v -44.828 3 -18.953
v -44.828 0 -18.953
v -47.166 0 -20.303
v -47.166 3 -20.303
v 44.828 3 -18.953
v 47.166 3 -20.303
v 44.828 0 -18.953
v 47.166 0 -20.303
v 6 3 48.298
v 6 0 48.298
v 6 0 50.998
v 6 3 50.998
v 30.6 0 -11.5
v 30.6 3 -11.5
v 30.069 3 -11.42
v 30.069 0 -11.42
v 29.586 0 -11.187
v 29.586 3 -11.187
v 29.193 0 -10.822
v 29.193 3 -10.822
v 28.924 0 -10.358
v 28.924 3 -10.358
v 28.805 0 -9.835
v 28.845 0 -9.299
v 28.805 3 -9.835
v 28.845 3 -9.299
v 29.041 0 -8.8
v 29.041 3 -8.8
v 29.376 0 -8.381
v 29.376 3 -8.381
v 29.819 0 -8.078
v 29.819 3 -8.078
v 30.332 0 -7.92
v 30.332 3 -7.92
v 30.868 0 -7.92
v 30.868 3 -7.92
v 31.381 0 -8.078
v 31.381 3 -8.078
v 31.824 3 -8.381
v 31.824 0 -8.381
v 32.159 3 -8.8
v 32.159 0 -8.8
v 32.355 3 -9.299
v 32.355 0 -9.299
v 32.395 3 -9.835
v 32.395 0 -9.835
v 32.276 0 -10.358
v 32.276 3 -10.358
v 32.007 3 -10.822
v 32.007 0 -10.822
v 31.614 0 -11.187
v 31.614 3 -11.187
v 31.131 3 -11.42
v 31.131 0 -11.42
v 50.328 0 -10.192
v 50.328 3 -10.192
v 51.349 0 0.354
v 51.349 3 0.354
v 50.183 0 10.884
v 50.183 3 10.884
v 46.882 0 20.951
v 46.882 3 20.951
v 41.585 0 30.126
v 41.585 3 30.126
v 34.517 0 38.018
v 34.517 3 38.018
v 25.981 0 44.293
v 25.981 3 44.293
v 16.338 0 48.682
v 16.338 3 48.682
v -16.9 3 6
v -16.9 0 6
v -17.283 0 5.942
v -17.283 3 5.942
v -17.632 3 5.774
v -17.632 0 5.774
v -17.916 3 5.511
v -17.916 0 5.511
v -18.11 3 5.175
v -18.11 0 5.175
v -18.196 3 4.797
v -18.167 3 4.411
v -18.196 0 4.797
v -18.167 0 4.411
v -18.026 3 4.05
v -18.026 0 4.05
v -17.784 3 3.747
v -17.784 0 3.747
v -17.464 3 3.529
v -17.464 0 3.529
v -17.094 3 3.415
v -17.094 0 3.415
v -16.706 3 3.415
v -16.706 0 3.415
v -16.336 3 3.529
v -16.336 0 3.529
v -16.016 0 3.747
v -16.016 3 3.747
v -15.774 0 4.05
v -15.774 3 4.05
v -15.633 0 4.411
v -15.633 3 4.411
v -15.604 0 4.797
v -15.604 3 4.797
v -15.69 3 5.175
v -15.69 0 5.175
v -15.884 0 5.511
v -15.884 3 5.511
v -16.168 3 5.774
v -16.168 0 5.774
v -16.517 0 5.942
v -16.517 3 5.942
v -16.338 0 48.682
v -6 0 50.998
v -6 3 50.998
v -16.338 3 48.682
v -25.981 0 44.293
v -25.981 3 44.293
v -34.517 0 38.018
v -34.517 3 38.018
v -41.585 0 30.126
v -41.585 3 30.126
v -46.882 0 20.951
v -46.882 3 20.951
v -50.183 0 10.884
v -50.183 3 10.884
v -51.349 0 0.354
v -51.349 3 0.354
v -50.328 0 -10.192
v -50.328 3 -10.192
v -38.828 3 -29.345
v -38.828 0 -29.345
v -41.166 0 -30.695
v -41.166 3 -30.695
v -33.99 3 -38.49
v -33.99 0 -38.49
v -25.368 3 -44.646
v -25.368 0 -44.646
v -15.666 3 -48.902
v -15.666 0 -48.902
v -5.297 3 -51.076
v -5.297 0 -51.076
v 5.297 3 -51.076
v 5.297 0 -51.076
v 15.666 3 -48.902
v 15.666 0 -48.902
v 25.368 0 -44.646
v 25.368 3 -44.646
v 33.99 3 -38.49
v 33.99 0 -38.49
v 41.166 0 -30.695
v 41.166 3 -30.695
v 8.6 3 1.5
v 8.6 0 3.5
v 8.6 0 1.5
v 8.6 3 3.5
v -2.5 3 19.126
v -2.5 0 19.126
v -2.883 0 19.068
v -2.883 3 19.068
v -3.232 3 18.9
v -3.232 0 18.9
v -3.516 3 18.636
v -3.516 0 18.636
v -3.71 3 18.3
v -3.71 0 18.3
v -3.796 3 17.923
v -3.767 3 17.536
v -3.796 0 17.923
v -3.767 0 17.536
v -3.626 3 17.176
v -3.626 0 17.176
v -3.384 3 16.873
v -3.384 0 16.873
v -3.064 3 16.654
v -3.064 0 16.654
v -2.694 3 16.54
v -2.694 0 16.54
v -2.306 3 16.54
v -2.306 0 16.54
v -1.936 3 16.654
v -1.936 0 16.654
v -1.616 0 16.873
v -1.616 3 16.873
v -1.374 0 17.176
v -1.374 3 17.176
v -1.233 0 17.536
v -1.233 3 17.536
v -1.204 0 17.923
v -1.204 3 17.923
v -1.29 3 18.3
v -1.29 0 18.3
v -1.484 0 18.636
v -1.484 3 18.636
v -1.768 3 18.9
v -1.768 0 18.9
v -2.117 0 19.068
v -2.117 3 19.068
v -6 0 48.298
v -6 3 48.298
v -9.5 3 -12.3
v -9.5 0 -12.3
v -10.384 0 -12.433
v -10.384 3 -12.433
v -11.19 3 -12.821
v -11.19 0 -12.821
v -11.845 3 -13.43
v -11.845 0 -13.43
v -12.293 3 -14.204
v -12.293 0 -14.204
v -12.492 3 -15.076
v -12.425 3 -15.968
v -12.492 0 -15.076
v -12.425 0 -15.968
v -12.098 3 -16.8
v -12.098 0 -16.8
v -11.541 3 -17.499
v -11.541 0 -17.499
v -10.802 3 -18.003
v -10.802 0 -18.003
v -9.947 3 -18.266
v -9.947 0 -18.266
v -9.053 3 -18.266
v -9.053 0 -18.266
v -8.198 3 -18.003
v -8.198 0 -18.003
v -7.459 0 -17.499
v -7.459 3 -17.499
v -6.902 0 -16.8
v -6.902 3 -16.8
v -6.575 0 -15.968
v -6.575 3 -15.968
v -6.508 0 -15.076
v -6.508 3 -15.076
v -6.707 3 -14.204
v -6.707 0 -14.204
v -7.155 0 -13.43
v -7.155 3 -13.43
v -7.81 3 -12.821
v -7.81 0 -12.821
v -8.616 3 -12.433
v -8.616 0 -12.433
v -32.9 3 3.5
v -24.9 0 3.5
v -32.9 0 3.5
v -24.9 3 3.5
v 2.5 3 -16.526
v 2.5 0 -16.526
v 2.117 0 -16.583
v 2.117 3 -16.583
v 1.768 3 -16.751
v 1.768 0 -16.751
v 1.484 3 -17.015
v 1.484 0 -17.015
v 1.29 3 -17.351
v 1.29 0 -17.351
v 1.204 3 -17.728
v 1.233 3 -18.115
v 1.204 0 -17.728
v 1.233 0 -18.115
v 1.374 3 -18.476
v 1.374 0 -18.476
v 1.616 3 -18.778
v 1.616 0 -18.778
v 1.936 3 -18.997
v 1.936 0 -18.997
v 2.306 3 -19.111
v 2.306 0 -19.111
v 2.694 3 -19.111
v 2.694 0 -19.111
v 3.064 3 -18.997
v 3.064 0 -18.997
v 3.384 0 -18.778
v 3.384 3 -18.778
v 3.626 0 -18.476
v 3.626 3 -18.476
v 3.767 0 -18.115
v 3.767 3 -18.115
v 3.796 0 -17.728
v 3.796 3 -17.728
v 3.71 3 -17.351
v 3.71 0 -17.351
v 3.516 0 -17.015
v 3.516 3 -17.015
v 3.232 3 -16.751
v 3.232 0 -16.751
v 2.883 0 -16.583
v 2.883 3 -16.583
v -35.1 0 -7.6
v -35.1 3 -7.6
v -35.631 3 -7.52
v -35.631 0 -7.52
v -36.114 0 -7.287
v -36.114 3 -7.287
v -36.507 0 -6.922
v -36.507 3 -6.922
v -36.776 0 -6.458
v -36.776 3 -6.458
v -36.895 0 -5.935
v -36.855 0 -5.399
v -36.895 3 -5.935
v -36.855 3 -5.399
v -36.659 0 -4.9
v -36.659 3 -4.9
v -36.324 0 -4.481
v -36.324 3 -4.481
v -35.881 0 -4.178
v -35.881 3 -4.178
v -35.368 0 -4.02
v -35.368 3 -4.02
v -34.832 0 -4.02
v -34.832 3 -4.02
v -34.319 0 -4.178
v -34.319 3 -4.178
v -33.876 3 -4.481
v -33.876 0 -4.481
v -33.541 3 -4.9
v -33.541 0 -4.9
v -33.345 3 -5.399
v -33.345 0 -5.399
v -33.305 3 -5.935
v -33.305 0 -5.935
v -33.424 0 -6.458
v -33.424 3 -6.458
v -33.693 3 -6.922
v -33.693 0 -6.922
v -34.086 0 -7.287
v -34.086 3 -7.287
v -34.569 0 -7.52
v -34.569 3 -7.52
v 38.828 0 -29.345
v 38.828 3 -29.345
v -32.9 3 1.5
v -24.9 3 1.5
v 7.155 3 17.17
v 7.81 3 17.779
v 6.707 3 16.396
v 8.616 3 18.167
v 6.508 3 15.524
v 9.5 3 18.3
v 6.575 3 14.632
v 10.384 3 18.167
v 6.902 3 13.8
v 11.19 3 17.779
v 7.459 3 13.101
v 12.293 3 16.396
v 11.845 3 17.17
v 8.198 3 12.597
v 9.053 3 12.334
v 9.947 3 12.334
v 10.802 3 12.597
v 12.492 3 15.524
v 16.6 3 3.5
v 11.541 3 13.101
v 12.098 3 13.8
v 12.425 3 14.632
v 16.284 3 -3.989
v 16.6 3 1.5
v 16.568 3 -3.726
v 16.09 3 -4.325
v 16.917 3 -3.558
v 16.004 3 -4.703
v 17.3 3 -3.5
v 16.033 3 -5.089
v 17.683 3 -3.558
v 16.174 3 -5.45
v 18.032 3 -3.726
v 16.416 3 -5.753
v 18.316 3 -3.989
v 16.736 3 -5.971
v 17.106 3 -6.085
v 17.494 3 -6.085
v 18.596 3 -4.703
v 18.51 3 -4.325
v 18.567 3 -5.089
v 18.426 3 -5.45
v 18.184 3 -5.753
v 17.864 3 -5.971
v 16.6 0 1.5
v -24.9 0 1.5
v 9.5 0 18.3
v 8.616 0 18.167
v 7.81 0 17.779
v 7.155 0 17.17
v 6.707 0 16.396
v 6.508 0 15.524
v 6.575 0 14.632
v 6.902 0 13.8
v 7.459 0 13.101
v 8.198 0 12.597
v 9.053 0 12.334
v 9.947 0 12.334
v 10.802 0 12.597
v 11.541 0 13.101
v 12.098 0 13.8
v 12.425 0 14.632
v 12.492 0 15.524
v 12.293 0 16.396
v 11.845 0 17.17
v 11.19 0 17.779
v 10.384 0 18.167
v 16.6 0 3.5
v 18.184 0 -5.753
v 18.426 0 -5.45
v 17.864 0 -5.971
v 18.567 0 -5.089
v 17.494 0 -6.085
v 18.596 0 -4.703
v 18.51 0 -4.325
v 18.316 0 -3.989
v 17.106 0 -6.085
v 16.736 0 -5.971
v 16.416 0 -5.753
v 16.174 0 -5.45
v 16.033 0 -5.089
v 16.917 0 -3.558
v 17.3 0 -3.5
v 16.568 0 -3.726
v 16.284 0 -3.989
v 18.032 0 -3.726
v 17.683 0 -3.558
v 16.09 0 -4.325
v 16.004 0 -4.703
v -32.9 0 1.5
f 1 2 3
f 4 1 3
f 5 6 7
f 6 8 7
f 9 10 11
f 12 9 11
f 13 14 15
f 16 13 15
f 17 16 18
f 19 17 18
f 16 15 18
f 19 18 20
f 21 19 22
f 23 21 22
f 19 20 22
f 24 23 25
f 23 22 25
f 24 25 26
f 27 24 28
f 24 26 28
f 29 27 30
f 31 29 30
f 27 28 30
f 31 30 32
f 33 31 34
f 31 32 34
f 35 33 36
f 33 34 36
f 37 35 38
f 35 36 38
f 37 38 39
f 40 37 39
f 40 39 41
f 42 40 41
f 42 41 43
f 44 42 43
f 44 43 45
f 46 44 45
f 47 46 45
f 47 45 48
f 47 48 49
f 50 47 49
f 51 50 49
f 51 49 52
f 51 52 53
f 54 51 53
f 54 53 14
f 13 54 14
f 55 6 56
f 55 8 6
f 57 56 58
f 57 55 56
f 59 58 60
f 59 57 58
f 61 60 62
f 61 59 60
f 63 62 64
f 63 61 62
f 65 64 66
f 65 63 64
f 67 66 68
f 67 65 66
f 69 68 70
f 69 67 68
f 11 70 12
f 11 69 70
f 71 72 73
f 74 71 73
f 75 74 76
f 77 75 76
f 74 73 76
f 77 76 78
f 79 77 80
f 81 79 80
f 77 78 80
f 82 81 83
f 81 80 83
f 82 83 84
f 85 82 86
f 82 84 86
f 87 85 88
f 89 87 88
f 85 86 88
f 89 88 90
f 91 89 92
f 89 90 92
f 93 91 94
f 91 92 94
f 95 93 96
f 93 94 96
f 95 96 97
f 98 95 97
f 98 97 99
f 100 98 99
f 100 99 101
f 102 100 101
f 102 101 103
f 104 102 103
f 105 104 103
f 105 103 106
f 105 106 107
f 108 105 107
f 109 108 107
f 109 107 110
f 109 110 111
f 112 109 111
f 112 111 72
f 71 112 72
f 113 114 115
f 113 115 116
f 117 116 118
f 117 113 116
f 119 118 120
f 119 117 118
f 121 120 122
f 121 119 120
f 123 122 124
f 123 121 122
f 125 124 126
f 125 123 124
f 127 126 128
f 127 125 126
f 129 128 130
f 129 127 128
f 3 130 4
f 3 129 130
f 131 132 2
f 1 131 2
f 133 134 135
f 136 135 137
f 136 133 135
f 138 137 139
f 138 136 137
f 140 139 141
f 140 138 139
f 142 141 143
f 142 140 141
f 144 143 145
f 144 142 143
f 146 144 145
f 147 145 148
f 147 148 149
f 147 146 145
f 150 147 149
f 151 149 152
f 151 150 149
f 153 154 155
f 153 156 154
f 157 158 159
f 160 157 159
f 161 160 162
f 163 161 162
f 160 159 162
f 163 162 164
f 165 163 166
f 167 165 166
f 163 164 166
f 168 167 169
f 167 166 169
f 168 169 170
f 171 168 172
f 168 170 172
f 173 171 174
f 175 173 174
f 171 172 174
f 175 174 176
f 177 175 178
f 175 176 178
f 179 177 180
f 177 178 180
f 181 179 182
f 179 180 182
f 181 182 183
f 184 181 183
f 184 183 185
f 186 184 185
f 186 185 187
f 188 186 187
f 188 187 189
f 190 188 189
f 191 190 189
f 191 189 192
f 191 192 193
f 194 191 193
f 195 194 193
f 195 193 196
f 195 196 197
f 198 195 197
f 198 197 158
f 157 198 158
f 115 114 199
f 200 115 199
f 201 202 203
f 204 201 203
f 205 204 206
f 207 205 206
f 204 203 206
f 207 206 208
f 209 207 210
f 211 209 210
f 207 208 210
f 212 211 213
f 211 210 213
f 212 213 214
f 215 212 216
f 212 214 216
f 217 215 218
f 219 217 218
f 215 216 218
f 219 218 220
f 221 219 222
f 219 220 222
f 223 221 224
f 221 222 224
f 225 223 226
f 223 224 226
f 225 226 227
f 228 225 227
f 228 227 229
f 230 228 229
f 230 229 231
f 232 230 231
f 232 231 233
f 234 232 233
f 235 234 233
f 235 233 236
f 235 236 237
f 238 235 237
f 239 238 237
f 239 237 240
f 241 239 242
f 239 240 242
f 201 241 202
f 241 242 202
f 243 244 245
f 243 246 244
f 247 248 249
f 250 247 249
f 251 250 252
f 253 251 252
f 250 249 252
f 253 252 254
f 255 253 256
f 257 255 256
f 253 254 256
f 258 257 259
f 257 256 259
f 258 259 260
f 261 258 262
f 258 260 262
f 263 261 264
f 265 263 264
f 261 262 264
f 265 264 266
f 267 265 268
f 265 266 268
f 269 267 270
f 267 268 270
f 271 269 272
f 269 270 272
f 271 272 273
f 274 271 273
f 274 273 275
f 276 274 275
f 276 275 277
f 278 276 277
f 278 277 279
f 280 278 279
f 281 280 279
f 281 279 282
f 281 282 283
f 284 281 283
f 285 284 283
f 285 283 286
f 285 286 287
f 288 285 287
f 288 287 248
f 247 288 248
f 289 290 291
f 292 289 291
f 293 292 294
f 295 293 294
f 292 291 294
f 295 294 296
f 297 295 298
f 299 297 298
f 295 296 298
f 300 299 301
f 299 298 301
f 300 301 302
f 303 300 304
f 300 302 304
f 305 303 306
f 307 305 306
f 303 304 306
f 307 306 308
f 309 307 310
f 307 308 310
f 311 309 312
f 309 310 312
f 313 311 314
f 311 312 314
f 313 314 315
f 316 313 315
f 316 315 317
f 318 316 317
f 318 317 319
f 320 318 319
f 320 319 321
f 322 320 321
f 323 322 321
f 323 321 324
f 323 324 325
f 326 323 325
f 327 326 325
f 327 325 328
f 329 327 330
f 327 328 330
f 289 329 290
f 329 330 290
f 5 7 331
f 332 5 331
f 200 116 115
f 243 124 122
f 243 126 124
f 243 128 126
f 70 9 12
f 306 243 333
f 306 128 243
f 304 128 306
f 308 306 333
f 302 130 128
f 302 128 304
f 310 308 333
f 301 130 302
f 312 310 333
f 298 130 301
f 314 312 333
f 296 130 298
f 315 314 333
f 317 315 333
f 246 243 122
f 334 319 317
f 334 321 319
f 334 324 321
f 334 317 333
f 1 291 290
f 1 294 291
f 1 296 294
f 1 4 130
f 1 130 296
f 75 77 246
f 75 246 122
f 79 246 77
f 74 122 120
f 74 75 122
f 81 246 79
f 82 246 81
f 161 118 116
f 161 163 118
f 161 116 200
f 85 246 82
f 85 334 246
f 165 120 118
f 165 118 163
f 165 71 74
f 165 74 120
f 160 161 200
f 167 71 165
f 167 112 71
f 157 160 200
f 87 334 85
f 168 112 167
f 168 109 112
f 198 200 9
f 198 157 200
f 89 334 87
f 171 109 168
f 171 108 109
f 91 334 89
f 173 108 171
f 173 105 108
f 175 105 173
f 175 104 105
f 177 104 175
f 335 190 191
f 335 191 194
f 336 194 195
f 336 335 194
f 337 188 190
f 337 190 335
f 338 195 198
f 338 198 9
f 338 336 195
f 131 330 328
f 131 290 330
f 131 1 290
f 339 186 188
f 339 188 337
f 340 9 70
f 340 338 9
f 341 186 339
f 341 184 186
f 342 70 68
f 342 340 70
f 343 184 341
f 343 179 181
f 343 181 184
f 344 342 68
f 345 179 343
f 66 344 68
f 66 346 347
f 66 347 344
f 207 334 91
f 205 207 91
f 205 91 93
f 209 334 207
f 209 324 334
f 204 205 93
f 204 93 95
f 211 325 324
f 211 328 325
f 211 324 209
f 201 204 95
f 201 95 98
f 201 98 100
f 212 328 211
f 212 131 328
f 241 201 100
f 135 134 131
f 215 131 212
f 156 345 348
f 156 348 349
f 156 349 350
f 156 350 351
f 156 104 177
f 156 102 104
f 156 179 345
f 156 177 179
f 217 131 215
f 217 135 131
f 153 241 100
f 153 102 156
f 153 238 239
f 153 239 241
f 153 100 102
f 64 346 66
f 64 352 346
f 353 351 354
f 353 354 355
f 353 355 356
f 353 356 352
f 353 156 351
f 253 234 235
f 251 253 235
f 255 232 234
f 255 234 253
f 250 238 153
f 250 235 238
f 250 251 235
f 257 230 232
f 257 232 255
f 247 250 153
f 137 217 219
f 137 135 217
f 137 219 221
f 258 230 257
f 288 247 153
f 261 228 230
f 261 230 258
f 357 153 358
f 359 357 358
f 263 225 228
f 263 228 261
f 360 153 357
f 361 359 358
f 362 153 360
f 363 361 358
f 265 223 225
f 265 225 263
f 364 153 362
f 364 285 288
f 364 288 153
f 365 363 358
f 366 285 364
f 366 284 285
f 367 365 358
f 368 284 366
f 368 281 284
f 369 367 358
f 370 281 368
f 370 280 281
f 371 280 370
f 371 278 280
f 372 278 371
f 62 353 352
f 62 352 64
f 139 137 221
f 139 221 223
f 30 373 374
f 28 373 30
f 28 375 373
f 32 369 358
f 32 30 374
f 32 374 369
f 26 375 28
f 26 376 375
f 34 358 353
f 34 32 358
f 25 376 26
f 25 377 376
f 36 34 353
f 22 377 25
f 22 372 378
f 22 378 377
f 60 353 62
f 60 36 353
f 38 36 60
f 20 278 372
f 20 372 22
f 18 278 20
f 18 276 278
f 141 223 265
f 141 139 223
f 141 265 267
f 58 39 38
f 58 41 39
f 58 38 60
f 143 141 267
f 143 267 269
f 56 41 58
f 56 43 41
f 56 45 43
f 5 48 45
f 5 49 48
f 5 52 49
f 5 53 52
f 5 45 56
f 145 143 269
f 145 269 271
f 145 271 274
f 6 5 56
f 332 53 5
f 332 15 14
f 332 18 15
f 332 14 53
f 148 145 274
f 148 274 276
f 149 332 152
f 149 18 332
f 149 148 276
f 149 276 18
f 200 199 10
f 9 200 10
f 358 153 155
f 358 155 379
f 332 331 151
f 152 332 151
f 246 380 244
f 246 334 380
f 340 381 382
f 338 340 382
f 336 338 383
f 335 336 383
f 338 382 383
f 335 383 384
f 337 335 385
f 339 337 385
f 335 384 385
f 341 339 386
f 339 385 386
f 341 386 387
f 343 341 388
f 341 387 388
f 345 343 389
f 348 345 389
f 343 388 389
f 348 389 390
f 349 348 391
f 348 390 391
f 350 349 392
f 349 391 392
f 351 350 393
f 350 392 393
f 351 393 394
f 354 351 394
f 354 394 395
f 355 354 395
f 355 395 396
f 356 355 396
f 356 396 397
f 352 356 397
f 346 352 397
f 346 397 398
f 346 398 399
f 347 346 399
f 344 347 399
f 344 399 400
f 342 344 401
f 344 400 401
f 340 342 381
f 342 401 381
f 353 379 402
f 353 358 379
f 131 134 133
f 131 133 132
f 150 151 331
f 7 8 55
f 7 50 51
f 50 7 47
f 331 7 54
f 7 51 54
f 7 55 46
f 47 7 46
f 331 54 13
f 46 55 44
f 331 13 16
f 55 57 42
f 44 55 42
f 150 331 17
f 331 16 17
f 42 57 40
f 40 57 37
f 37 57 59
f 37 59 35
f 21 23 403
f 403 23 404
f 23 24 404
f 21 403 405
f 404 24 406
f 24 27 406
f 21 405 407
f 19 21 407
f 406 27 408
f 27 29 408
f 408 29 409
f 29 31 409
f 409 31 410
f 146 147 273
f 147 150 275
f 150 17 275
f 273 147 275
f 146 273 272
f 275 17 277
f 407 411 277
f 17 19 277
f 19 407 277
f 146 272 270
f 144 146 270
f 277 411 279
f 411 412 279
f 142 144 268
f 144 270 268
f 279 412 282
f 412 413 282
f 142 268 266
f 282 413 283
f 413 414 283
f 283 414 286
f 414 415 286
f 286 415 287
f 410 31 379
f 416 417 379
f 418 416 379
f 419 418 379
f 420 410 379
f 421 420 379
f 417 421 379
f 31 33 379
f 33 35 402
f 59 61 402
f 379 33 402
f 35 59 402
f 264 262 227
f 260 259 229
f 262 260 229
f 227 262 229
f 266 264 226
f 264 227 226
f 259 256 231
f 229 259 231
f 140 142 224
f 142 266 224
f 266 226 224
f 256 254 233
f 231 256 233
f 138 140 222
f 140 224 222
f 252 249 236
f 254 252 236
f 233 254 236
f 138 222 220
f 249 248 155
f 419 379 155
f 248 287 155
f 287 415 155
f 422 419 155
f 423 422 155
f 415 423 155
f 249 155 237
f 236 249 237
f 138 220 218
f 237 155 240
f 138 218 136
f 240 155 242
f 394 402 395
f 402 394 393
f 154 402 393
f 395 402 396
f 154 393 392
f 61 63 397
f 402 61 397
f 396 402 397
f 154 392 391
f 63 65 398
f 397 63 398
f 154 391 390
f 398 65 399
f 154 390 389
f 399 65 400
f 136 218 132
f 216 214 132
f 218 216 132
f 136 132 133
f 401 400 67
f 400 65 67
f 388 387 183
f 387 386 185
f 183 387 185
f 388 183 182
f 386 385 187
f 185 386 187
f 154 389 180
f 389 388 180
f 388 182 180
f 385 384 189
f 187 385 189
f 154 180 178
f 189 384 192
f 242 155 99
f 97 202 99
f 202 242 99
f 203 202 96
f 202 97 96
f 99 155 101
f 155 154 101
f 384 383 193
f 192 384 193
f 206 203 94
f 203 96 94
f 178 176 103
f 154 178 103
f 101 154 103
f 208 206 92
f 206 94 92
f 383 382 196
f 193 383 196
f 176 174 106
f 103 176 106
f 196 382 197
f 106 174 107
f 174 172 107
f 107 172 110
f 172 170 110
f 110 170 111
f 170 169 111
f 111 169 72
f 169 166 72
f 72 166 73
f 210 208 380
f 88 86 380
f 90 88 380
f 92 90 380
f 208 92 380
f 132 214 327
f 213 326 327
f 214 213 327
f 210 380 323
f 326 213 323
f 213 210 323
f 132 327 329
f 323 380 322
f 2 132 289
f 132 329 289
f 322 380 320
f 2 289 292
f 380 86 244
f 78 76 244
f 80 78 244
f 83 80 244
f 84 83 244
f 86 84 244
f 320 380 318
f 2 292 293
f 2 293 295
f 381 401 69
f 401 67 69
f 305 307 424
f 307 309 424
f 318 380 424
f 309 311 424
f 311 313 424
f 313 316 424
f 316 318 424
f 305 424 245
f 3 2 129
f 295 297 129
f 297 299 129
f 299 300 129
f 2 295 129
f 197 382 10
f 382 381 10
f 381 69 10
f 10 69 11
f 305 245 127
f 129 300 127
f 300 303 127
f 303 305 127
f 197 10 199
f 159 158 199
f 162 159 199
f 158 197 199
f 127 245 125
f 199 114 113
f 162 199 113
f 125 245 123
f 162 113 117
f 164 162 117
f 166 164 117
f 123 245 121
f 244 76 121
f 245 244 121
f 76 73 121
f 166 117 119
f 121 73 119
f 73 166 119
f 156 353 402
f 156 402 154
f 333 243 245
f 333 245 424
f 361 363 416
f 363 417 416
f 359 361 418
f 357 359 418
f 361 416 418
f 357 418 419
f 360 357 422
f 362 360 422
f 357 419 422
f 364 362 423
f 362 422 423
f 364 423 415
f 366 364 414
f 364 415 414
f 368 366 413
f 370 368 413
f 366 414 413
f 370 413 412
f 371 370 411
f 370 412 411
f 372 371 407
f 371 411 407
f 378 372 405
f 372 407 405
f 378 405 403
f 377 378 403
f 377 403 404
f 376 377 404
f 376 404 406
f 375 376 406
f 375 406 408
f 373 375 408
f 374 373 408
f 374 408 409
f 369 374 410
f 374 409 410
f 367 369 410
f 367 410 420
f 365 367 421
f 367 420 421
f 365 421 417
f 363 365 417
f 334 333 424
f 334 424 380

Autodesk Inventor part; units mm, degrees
ref_plane "YZ Plane" through (0, 0, 0) normal (1, 0, 0) x (0, 1, 0)
ref_plane "XZ Plane" through (0, 0, 0) normal (0, 1, 0) x (-1, 0, 0)
ref_plane "XY Plane" through (0, 0, 0) normal (0, 0, 1) x (1, 0, 0)
sketch "Sketch9" plane through (0, 3, 0) normal (0, 1, 0) x (1, 0, 0)
  line L0 (10.4056, -28.6) -> (-19.5944, -28.6)
  line L1 (-19.5944, -28.6) -> (-19.5944, -24.6)
  line L2 (-19.5944, -24.6) -> (10.4056, -24.6)
  line L3 (10.4056, -24.6) -> (10.4056, -28.6)
  point P0 (0, 0)
sketch "Sketch1" plane through (0, 0, 0) normal (0, 1, 0) x (-1, 0, 0)
  circle A0 centre (0, 0) radius 51.35
  dimension "d0" = 102.7
extrude "Plate1" add sketch "Sketch1" along normal blind 3
sketch "Sketch2" plane through (0, 0, 0) normal (0, 1, 0) x (-1, 0, 0)
  line L0 (6, 48.2983) -> (-6, 48.2983)
  line L1 (-6, 48.2983) -> (-6, 53.6983)
  line L2 (-6, 53.6983) -> (6, 53.6983)
  line L3 (6, 53.6983) -> (6, 48.2983)
  line L4 (6, 48.2983) -> (-6, 48.2983)
  line L5 (-6, 48.2983) -> (-6, 50.9983)
  line L6 (-6, 50.9983) -> (6, 50.9983)
  line L7 (6, 50.9983) -> (6, 48.2983)
  circle A0 centre (0, 0) radius 51.35 projected
  point P0 (0, 48.2983)
  point P1 (0, 48.2983)
  dimension "d2" = 2.7
  dimension "d3" = 12
extrude "Cut1" cut sketch "Sketch2" along normal through all contours L0 L1 L6 L3 | A0 L1 L2 L3 | L6 A0
pattern_circular "Circular Pattern1" count 3 over 360 about axis through (0, -10, 0) along (0, 1, 0) of "Cut1"
sketch "Sketch3" plane through (0, 0, 0) normal (0, 1, 0) x (-1, 0, 0)
  point P0 (0, 0)
  point P1 (35.1, -5.8)
  point P2 (-30.6, -9.7)
  dimension "d9" = 5.8
  dimension "d10" = 35.1
  dimension "d11" = 9.7
  dimension "d12" = 30.6
hole "Hole1" at (-35.1, 0, -5.8) at (30.6, 0, -9.7) direction (0, 1, 0) diameter 3.6 end through all
sketch "Sketch4" plane through (0, 3, 0) normal (0, 1, 0) x (1, 0, 0)
  point P0 (0, 0)
  point P1 (-16.9, -4.7)
  point P2 (17.3, 4.8)
  dimension "d20" = 4.7
  dimension "d21" = 16.9
  dimension "d22" = 17.3
  dimension "d23" = 4.8
hole "Hole2" at (-16.9, 3, 4.7) at (17.3, 3, -4.8) direction (0, -1, 0) diameter 2.6 end through all
sketch "Sketch5" plane through (0, 3, 0) normal (0, 1, 0) x (1, 0, 0)
  point P0 (0, 0)
  point P1 (-9.5, 15.3)
  point P2 (9.5, -15.3)
  dimension "d31" = 9.5
  dimension "d32" = 15.3
  dimension "d33" = 9.5
  dimension "d34" = 15.3
hole "Hole3" at (-9.5, 3, -15.3) at (9.5, 3, 15.3) direction (0, -1, 0) diameter 6 end through all
sketch "Sketch6" plane through (0, 3, 0) normal (0, 1, 0) x (1, 0, 0)
  line L0 (-32.9, -1.5) -> (-24.9, -1.5)
  line L1 (-24.9, -1.5) -> (-24.9, -3.5)
  line L2 (-24.9, -3.5) -> (-32.9, -3.5)
  line L3 (-32.9, -3.5) -> (-32.9, -1.5)
  line L4 (8.6, -1.5) -> (16.6, -1.5)
  line L5 (16.6, -1.5) -> (16.6, -3.5)
  line L6 (16.6, -3.5) -> (8.6, -3.5)
  line L7 (8.6, -3.5) -> (8.6, -1.5)
  line L8 (-19.5944, -24.6) -> (10.4056, -24.6)
  line L9 (10.4056, -24.6) -> (10.4056, -28.6)
  line L10 (10.4056, -28.6) -> (-19.5944, -28.6)
  line L11 (-19.5944, -28.6) -> (-19.5944, -24.6)
  point P0 (0, 0)
  dimension "d42" = 8
  dimension "d43" = 8
  dimension "d44" = 33.5
  dimension "d45" = 24.9
  dimension "d46" = 2
  dimension "d47" = 1.5
  dimension "d48" = 21.1
  dimension "d49" = 30
  dimension "d50" = 4
extrude "Cut2" cut sketch "Sketch6" against normal blind 3
sketch "Sketch7" plane through (0, 3, 0) normal (0, 1, 0) x (1, 0, 0)
  point P0 (0, 0)
  point P1 (0, 18)
  point P2 (0, -18)
  dimension "d53" = 18
  dimension "d54" = 18
hole "Hole4" [suppressed]
sketch "Sketch8" plane through (0, 3, 0) normal (0, 1, 0) x (1, 0, 0)
  circle A0 centre (0, 0) radius 18
  point P0 (2.5, 17.8255)
  point P1 (-2.5, -17.8255)
  dimension "d62" = 36
  dimension "d63" = 2.5
  dimension "d64" = 2.5
hole "Hole5" at (2.5, 3, -17.8255) at (-2.5, 3, 17.8255) direction (0, -1, 0) diameter 2.6 end through all
sheet face with bend "Face2" sketch "Sketch9" thickness 3 toward (0, -1, 0) bend radius 3
bend "Bend1"
equation "\"d4\" = Thickness"
equation "\"d18\" = Thickness"
equation "\"d29\" = Thickness"
equation "\"d40\" = Thickness"
equation "\"d51\" = Thickness"
equation "\"d60\" = Thickness"
equation "\"d70\" = Thickness"
equation "\"d77\" = Thickness"
equation "\"d72\" = BendRadius"
equation "\"d73\" = BendReliefWidth"
equation "\"d75\" = MinimumRemnant"
equation "\"d74\" = BendReliefDepth"
equation "\"d76\" = BendRadius"
equation "\"BendRadius\" = Thickness"
equation "\"BendReliefWidth\" = Thickness"
equation "\"BendReliefDepth\" = 0.5 * Thickness"
equation "\"CornerReliefSize\" = 4 * Thickness"
equation "\"MinimumRemnant\" = 2 * Thickness"
equation "\"TransitionRadius\" = BendRadius"
equation "\"JacobiRadiusSize\" = BendRadius"
equation "\"GapSize\" = Thickness"
equation "\"d1\" = BendRadius"
equation "\"Thickness\" = 3"
properties part number "LUXCAN BASE DE MONTAJE LENTE"
